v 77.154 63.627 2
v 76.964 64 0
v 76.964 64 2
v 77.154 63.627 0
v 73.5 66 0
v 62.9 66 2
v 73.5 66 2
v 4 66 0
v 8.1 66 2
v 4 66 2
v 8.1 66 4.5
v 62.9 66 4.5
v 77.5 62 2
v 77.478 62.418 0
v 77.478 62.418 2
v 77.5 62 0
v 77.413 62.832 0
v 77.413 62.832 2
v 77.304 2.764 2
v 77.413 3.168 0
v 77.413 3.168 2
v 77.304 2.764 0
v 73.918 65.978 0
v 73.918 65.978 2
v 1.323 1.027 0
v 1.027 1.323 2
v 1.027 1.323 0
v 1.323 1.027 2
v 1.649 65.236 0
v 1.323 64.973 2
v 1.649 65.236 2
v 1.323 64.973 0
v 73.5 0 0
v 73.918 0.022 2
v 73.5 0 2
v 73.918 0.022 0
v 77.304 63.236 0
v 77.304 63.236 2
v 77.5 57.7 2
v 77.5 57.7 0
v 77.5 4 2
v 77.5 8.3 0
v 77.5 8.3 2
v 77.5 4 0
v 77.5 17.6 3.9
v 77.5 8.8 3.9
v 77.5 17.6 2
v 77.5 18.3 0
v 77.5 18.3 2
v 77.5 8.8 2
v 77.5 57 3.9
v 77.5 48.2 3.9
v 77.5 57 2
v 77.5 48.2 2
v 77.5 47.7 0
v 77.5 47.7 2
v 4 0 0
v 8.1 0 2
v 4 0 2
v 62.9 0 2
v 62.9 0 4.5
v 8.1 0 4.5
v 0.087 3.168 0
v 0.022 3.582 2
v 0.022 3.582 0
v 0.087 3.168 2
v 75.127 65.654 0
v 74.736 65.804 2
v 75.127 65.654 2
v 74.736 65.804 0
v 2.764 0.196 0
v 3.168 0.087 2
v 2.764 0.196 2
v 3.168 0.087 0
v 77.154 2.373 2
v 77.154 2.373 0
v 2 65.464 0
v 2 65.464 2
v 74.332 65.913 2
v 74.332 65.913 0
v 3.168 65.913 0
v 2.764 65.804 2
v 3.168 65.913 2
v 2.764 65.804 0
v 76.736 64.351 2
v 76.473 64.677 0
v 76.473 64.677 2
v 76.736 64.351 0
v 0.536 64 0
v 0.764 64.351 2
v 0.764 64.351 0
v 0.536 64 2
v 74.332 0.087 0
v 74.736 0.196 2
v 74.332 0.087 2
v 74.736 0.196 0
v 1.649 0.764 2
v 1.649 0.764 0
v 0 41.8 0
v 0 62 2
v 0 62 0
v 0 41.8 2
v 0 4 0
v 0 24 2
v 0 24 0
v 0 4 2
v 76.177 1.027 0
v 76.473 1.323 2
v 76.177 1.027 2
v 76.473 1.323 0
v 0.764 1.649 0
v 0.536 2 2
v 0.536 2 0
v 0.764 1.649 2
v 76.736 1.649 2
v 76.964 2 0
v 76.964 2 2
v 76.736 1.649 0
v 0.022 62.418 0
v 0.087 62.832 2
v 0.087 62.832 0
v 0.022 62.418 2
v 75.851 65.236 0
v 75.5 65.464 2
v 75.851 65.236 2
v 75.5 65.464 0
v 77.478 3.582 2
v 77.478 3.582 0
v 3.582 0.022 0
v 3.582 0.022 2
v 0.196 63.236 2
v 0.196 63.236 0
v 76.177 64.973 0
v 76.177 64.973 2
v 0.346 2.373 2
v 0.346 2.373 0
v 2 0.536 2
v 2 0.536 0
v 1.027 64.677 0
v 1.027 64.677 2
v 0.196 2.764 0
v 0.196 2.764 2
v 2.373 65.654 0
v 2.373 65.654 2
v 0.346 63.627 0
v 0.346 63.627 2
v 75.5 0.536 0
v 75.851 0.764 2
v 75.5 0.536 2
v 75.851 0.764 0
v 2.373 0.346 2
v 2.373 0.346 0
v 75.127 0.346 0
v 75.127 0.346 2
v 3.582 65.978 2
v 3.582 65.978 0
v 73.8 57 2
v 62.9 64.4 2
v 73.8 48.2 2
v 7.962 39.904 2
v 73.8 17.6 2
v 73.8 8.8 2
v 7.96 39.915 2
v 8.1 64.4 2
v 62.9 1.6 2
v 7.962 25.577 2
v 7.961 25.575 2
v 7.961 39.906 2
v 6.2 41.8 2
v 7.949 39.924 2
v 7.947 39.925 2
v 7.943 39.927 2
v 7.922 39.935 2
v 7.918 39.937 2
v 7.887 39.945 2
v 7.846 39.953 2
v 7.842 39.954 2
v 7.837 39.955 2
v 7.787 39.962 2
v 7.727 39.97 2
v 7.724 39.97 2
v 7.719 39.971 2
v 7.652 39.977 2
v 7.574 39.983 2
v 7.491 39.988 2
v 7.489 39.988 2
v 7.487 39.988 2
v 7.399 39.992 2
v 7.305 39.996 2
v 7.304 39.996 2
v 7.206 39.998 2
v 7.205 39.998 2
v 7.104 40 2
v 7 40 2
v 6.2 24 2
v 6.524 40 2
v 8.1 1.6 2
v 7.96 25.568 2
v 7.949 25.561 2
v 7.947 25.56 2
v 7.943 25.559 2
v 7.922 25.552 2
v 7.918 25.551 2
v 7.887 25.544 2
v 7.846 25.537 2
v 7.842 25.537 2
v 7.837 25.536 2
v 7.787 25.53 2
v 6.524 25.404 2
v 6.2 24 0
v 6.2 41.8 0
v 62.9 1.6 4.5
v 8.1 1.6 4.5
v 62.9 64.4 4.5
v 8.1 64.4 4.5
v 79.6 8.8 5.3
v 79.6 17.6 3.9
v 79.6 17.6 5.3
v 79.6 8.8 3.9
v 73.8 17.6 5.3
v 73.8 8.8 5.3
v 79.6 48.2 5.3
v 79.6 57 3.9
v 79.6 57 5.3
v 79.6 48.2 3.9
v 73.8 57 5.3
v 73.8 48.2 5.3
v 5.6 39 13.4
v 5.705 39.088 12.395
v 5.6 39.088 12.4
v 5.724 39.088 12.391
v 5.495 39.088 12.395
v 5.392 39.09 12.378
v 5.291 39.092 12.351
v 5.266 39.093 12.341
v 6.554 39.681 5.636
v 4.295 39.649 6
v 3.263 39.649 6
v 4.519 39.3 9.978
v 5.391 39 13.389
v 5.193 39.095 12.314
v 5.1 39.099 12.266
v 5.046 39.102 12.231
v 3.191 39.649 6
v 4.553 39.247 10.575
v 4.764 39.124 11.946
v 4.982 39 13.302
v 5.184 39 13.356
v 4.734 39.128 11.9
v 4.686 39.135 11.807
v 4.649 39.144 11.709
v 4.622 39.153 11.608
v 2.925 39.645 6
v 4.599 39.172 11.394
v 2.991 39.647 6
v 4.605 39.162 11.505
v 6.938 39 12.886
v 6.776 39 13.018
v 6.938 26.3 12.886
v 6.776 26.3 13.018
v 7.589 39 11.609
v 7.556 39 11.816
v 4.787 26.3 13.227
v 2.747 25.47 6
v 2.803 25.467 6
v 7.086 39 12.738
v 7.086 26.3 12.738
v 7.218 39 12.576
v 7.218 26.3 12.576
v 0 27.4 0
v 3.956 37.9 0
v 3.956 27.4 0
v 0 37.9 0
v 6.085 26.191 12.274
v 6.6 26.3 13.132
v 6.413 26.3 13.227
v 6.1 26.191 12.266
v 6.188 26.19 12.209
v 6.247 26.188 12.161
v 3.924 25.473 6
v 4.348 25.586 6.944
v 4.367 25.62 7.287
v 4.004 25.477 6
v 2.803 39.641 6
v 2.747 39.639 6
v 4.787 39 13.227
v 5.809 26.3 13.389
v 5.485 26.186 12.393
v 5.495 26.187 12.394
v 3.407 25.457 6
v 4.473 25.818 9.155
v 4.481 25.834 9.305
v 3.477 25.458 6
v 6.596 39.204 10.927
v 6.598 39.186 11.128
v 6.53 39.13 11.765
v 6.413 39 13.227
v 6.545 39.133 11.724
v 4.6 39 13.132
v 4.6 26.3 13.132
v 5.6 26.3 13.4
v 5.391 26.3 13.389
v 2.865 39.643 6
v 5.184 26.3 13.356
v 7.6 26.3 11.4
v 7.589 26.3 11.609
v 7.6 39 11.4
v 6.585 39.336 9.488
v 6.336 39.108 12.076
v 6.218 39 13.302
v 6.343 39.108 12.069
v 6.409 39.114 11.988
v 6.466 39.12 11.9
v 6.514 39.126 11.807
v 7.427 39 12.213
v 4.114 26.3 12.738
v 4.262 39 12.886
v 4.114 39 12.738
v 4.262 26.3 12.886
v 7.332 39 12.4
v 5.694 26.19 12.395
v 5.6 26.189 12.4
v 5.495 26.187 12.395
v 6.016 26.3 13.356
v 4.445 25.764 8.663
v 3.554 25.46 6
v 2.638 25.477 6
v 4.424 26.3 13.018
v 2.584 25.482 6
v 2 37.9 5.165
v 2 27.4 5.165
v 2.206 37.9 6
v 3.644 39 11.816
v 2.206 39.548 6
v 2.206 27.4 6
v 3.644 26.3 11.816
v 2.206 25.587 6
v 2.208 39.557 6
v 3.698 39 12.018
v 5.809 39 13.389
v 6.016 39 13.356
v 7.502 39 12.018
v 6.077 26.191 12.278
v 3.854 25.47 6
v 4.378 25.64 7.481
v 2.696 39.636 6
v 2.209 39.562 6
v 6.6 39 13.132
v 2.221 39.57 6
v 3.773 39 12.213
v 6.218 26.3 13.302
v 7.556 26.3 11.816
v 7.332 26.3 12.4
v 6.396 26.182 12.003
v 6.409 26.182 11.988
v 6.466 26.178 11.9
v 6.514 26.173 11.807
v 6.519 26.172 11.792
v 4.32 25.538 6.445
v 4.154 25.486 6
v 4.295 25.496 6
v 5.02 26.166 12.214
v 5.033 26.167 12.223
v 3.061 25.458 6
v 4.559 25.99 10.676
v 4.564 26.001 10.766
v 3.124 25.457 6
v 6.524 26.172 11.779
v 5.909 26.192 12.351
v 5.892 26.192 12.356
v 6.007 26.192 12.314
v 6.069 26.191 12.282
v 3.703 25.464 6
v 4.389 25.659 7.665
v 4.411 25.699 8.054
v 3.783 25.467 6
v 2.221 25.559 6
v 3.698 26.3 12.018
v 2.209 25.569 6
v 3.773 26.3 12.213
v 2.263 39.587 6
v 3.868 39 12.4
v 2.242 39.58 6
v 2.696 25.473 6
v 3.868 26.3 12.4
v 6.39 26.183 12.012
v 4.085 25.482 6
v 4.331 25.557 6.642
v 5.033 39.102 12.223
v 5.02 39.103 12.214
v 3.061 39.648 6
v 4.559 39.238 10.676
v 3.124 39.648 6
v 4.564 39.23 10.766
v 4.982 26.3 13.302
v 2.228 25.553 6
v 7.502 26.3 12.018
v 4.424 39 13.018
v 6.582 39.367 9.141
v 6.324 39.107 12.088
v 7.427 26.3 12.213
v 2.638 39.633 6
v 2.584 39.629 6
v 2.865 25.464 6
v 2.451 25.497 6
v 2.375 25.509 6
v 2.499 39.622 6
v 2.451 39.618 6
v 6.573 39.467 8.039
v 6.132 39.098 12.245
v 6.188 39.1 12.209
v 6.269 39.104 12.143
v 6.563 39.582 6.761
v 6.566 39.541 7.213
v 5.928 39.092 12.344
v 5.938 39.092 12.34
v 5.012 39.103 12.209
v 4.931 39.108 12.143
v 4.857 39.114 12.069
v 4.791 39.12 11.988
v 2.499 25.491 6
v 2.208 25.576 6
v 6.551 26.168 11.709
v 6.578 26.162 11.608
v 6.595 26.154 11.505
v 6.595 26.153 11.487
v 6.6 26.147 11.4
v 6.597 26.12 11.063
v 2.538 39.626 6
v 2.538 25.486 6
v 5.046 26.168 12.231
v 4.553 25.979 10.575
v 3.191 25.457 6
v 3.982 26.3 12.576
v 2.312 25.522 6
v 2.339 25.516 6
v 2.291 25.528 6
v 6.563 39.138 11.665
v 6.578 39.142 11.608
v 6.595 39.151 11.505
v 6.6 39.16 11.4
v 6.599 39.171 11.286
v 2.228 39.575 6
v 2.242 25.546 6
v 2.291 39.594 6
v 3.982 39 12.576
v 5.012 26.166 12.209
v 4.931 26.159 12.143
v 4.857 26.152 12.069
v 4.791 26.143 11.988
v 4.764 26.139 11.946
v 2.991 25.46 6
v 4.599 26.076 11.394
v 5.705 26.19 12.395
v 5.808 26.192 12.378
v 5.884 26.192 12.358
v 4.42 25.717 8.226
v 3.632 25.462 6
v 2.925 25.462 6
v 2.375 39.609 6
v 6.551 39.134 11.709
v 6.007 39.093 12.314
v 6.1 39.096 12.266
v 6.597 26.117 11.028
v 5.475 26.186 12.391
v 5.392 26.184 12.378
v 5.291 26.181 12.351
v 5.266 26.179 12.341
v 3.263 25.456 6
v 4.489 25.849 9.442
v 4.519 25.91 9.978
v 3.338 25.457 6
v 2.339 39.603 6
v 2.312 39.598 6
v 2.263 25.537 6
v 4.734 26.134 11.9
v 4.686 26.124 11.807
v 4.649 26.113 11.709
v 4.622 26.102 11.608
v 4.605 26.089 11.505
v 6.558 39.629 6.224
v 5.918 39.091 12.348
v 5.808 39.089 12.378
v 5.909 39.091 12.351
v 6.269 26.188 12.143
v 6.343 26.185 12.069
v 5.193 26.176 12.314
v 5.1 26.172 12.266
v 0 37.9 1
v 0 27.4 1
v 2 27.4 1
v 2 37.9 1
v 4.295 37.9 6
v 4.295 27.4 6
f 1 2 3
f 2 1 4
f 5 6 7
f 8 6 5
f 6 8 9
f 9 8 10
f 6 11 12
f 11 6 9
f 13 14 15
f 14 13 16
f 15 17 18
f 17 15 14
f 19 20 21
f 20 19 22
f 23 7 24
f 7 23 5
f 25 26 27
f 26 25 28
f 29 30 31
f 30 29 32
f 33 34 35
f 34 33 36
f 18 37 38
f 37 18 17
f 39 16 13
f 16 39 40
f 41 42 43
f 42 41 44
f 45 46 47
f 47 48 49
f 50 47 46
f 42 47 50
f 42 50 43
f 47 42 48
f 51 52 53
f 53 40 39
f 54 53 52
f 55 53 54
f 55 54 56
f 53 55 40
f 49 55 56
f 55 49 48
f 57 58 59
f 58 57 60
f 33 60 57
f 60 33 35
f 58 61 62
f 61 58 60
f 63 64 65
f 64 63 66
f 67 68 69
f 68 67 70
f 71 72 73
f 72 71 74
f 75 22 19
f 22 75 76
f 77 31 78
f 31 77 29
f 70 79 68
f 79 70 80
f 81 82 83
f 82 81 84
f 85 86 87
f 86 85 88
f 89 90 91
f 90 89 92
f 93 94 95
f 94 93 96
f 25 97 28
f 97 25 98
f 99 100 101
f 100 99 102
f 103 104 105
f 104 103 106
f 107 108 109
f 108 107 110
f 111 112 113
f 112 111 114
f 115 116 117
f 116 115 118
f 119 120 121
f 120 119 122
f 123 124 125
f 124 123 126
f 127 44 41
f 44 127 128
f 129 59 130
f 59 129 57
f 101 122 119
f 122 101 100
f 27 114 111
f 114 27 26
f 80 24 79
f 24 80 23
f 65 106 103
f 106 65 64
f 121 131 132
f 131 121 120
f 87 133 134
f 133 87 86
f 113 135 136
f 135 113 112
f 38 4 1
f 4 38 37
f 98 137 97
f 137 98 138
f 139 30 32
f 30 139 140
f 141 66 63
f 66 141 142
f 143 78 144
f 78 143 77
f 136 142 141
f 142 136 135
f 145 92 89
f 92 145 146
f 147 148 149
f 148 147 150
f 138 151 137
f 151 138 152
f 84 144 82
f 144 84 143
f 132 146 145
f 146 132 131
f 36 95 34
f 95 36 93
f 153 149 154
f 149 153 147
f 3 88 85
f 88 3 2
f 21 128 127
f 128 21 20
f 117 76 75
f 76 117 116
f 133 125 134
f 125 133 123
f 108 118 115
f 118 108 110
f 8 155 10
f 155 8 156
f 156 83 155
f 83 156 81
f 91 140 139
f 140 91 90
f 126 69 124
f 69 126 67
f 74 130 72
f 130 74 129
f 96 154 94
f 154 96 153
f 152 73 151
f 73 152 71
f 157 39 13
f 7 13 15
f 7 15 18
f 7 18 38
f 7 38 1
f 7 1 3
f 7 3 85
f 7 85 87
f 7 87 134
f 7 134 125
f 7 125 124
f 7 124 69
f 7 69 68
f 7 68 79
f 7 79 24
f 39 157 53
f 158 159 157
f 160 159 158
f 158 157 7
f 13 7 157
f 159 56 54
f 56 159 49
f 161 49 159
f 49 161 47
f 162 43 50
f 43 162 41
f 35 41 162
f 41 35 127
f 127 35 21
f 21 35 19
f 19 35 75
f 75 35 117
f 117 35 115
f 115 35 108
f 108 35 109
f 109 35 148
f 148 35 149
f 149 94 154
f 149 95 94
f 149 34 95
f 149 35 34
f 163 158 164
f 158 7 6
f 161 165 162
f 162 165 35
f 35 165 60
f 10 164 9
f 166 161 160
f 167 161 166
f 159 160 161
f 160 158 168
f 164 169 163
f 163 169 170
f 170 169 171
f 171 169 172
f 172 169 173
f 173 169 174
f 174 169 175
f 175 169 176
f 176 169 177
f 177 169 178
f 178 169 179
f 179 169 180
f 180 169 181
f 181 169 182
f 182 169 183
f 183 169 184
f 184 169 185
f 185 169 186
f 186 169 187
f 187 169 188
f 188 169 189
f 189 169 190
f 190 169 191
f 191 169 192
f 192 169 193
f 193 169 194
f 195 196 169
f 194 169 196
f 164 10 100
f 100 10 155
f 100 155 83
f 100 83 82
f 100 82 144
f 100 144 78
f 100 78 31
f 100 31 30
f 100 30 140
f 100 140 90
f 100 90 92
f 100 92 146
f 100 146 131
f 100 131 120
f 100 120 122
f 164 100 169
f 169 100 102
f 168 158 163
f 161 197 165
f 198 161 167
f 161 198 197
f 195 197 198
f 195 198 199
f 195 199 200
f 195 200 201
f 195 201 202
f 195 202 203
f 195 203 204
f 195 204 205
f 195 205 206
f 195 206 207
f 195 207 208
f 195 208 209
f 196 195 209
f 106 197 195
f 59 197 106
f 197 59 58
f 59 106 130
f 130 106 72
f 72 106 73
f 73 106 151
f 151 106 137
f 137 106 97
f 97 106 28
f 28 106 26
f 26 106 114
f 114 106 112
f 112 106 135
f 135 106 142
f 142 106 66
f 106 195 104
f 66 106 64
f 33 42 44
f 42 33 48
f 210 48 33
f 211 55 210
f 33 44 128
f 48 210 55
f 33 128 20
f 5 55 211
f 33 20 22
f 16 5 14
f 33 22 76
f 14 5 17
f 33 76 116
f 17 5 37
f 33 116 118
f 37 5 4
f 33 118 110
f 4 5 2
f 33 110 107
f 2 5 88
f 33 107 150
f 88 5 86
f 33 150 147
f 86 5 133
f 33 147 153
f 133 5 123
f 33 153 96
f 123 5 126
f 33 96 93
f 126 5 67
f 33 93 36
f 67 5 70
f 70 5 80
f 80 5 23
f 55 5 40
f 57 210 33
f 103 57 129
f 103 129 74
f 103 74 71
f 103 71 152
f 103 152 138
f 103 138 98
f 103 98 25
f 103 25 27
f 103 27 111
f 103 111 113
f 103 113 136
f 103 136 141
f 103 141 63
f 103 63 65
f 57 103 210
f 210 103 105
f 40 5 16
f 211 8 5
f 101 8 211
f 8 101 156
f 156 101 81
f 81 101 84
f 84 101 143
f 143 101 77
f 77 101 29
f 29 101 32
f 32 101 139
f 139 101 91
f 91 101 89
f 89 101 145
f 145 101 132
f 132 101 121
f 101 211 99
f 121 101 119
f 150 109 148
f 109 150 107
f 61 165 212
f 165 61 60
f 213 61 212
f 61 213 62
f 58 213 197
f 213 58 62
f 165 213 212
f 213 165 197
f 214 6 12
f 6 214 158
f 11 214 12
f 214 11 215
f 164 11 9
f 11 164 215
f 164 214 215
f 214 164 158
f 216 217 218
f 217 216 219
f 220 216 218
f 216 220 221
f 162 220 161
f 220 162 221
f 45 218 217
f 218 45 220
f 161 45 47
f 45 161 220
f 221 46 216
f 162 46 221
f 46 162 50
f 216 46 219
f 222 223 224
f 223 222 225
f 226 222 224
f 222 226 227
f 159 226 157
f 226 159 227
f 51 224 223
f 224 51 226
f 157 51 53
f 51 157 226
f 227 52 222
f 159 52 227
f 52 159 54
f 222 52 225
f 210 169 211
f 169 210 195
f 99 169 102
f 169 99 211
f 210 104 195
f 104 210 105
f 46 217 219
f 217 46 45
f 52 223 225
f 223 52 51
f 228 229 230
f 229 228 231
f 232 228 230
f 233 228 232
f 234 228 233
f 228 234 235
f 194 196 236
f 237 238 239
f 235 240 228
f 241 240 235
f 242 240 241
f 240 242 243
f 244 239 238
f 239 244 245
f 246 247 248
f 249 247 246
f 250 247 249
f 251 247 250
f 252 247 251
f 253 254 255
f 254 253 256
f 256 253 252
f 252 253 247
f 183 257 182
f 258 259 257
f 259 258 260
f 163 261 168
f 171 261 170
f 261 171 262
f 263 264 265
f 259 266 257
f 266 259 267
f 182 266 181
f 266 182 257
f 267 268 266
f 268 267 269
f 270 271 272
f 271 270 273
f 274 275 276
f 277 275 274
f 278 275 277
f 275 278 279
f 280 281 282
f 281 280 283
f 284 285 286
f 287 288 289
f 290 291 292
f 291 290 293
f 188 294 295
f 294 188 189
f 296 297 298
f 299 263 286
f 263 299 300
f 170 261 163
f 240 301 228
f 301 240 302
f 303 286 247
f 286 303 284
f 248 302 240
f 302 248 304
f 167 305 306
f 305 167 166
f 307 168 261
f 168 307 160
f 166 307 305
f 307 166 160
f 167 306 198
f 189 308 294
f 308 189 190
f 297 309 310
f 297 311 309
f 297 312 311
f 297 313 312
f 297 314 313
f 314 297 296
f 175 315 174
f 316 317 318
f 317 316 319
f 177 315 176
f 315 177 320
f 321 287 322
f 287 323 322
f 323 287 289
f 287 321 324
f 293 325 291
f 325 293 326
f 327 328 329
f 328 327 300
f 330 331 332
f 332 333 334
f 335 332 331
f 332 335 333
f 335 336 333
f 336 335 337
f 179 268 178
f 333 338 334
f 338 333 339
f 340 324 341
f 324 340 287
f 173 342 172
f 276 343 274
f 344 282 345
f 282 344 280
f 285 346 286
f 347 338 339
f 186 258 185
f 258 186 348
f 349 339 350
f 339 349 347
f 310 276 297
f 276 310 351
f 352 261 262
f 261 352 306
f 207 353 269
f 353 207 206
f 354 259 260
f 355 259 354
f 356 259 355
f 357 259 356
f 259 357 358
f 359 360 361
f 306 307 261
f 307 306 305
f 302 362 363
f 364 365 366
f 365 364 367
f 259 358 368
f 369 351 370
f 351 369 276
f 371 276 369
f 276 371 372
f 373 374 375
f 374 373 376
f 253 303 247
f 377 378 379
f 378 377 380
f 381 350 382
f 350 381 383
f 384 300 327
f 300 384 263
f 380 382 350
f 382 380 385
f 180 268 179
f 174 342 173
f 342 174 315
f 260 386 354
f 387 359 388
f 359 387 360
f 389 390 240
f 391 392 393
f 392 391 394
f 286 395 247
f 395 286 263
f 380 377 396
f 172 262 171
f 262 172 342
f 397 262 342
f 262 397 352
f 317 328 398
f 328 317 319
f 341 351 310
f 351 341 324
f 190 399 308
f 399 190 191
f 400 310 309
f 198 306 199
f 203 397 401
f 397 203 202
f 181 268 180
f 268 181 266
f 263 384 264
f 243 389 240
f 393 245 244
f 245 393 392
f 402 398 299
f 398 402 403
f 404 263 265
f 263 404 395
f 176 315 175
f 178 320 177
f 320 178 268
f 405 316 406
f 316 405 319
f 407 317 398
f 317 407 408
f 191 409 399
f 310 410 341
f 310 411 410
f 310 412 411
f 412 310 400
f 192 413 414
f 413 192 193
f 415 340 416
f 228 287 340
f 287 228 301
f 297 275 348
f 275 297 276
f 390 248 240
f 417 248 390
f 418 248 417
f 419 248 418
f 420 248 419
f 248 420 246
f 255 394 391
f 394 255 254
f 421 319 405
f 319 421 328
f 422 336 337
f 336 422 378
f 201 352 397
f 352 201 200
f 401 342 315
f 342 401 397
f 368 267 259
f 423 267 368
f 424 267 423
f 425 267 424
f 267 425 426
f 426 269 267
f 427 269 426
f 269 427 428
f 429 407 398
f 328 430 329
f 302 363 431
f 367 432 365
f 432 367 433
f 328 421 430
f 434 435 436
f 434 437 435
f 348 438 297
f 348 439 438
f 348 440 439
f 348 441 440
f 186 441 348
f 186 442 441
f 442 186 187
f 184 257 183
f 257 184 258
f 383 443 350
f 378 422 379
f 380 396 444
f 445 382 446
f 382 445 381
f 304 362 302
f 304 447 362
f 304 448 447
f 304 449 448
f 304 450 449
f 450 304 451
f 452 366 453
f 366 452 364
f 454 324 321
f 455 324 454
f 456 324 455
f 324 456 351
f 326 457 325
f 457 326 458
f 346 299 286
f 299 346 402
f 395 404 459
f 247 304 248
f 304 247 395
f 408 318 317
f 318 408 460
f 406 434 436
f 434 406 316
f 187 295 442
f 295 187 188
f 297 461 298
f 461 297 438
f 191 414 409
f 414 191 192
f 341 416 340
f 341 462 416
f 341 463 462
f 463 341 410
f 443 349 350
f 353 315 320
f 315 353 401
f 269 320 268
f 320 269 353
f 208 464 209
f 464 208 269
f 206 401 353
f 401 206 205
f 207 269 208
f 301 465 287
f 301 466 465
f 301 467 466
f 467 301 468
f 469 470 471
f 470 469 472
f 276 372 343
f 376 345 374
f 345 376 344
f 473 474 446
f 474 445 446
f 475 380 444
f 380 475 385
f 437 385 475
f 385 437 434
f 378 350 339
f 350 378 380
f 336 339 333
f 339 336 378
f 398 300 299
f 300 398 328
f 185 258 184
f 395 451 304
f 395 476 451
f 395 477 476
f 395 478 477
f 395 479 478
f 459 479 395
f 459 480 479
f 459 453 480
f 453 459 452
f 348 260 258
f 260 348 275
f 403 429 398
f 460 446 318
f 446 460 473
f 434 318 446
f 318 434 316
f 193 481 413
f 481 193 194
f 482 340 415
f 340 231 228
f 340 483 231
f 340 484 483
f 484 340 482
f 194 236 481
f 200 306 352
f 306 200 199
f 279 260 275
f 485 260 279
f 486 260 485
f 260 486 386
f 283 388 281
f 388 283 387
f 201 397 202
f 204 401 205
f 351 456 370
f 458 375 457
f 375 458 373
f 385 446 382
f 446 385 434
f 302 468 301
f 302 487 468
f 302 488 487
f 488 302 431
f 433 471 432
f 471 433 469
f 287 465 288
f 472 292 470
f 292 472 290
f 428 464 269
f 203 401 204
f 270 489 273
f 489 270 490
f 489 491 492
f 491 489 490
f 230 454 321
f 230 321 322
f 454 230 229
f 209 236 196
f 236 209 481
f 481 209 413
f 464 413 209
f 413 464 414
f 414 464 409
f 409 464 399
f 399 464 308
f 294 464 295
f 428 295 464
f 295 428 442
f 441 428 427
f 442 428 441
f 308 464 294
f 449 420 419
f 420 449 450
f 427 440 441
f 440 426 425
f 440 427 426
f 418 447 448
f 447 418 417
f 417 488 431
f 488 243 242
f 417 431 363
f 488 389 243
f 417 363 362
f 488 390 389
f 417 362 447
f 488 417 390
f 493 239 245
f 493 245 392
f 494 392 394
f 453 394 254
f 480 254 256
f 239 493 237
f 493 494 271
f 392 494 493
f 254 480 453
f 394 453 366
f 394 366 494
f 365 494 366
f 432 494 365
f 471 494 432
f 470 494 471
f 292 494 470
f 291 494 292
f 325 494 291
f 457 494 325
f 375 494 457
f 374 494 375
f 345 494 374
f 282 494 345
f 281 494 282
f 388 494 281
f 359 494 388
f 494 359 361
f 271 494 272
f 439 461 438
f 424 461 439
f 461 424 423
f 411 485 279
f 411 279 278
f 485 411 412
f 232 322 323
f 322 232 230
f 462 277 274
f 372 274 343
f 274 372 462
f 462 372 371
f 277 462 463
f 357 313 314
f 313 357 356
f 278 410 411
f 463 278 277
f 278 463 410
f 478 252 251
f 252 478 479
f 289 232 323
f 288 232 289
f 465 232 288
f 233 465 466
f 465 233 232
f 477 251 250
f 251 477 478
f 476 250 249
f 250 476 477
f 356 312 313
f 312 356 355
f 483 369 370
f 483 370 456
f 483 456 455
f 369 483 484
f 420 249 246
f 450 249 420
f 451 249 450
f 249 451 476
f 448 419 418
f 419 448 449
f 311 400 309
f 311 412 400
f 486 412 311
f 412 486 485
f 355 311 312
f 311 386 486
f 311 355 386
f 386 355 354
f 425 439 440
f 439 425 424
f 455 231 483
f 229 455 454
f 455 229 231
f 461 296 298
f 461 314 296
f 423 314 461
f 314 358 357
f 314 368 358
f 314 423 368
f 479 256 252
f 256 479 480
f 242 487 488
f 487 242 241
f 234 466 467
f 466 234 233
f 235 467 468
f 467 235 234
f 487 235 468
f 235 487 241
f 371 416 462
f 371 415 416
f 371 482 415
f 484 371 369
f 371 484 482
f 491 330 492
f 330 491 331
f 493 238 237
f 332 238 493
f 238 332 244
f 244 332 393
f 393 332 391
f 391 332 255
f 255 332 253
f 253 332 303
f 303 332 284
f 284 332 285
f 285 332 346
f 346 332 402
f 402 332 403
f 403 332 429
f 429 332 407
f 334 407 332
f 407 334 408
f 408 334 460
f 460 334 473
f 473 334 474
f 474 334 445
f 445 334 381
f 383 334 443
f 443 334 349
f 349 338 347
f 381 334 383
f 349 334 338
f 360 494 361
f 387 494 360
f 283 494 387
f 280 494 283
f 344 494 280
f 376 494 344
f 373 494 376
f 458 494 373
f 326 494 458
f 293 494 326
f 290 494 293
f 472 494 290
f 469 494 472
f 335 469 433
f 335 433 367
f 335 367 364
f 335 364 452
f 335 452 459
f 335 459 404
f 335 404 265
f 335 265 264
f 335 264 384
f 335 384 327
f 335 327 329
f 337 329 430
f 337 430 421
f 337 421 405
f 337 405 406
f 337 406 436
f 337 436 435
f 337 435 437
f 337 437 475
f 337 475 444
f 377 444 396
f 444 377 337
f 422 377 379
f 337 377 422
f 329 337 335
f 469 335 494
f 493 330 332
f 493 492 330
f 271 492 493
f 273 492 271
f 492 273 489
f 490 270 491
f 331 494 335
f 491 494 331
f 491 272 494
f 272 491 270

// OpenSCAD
$fn=60;
main();
translate([2,40,1]) clipsu();


module clipsu() {
rotate([90,0,0]){
	difference () {
		union(){
			hull () {
				translate([0,0,0]) cylinder(r=1,h=15);
				translate([5,0,0]) cylinder(r=1,h=14.5);
				translate([3.6,10.4,1]) cylinder(r=2,h=12.7);
				}
				translate([-2,-1,0]) cube([2,1,15]);

			}
		union(){
			hull() { 
				translate([3.6,10.4,-1]) cylinder(r=1,h=16);
				translate([3.5,-2,-1]) cylinder(r=1,h=16);
				translate([2.9,-2,-1]) cylinder(r=1,h=16);
				}
			translate([-3,0,-0.5]) cube([3,5,16]);
			translate([-2,-2,-0.5]) cube([5,7,2.6]);
			translate([-2,-2,12.6]) cube([5,7,2.6]);
			}
		}
	}
}

module main() {
difference(){
union(){
//cube([6.2,24,2]);
//translate([0,42,0]) cube([6.2,24,2]);
translate([4,4,0])
minkowski(){
cube([69.5,58,1]);
cylinder(r=4,h=1,$fn=60);
}
translate([8.1,0,0]) cube([54.8,1.6,4.5]);
translate([8.1,64.4,0]) cube([54.8,1.6,4.5]);
translate([73.8,8.8,0]) cube([5.8,8.8,5.3]);
translate([73.8,48.2,0]) cube([5.8,8.8,5.3]);
}
union(){
translate([0,24,0]) cube([6.2,17.8,2]);
translate([77.5,8.3,0]) cube([3,10,3.9]);
translate([77.5,47.7,0]) cube([3,10,3.9]);
}
}
}
